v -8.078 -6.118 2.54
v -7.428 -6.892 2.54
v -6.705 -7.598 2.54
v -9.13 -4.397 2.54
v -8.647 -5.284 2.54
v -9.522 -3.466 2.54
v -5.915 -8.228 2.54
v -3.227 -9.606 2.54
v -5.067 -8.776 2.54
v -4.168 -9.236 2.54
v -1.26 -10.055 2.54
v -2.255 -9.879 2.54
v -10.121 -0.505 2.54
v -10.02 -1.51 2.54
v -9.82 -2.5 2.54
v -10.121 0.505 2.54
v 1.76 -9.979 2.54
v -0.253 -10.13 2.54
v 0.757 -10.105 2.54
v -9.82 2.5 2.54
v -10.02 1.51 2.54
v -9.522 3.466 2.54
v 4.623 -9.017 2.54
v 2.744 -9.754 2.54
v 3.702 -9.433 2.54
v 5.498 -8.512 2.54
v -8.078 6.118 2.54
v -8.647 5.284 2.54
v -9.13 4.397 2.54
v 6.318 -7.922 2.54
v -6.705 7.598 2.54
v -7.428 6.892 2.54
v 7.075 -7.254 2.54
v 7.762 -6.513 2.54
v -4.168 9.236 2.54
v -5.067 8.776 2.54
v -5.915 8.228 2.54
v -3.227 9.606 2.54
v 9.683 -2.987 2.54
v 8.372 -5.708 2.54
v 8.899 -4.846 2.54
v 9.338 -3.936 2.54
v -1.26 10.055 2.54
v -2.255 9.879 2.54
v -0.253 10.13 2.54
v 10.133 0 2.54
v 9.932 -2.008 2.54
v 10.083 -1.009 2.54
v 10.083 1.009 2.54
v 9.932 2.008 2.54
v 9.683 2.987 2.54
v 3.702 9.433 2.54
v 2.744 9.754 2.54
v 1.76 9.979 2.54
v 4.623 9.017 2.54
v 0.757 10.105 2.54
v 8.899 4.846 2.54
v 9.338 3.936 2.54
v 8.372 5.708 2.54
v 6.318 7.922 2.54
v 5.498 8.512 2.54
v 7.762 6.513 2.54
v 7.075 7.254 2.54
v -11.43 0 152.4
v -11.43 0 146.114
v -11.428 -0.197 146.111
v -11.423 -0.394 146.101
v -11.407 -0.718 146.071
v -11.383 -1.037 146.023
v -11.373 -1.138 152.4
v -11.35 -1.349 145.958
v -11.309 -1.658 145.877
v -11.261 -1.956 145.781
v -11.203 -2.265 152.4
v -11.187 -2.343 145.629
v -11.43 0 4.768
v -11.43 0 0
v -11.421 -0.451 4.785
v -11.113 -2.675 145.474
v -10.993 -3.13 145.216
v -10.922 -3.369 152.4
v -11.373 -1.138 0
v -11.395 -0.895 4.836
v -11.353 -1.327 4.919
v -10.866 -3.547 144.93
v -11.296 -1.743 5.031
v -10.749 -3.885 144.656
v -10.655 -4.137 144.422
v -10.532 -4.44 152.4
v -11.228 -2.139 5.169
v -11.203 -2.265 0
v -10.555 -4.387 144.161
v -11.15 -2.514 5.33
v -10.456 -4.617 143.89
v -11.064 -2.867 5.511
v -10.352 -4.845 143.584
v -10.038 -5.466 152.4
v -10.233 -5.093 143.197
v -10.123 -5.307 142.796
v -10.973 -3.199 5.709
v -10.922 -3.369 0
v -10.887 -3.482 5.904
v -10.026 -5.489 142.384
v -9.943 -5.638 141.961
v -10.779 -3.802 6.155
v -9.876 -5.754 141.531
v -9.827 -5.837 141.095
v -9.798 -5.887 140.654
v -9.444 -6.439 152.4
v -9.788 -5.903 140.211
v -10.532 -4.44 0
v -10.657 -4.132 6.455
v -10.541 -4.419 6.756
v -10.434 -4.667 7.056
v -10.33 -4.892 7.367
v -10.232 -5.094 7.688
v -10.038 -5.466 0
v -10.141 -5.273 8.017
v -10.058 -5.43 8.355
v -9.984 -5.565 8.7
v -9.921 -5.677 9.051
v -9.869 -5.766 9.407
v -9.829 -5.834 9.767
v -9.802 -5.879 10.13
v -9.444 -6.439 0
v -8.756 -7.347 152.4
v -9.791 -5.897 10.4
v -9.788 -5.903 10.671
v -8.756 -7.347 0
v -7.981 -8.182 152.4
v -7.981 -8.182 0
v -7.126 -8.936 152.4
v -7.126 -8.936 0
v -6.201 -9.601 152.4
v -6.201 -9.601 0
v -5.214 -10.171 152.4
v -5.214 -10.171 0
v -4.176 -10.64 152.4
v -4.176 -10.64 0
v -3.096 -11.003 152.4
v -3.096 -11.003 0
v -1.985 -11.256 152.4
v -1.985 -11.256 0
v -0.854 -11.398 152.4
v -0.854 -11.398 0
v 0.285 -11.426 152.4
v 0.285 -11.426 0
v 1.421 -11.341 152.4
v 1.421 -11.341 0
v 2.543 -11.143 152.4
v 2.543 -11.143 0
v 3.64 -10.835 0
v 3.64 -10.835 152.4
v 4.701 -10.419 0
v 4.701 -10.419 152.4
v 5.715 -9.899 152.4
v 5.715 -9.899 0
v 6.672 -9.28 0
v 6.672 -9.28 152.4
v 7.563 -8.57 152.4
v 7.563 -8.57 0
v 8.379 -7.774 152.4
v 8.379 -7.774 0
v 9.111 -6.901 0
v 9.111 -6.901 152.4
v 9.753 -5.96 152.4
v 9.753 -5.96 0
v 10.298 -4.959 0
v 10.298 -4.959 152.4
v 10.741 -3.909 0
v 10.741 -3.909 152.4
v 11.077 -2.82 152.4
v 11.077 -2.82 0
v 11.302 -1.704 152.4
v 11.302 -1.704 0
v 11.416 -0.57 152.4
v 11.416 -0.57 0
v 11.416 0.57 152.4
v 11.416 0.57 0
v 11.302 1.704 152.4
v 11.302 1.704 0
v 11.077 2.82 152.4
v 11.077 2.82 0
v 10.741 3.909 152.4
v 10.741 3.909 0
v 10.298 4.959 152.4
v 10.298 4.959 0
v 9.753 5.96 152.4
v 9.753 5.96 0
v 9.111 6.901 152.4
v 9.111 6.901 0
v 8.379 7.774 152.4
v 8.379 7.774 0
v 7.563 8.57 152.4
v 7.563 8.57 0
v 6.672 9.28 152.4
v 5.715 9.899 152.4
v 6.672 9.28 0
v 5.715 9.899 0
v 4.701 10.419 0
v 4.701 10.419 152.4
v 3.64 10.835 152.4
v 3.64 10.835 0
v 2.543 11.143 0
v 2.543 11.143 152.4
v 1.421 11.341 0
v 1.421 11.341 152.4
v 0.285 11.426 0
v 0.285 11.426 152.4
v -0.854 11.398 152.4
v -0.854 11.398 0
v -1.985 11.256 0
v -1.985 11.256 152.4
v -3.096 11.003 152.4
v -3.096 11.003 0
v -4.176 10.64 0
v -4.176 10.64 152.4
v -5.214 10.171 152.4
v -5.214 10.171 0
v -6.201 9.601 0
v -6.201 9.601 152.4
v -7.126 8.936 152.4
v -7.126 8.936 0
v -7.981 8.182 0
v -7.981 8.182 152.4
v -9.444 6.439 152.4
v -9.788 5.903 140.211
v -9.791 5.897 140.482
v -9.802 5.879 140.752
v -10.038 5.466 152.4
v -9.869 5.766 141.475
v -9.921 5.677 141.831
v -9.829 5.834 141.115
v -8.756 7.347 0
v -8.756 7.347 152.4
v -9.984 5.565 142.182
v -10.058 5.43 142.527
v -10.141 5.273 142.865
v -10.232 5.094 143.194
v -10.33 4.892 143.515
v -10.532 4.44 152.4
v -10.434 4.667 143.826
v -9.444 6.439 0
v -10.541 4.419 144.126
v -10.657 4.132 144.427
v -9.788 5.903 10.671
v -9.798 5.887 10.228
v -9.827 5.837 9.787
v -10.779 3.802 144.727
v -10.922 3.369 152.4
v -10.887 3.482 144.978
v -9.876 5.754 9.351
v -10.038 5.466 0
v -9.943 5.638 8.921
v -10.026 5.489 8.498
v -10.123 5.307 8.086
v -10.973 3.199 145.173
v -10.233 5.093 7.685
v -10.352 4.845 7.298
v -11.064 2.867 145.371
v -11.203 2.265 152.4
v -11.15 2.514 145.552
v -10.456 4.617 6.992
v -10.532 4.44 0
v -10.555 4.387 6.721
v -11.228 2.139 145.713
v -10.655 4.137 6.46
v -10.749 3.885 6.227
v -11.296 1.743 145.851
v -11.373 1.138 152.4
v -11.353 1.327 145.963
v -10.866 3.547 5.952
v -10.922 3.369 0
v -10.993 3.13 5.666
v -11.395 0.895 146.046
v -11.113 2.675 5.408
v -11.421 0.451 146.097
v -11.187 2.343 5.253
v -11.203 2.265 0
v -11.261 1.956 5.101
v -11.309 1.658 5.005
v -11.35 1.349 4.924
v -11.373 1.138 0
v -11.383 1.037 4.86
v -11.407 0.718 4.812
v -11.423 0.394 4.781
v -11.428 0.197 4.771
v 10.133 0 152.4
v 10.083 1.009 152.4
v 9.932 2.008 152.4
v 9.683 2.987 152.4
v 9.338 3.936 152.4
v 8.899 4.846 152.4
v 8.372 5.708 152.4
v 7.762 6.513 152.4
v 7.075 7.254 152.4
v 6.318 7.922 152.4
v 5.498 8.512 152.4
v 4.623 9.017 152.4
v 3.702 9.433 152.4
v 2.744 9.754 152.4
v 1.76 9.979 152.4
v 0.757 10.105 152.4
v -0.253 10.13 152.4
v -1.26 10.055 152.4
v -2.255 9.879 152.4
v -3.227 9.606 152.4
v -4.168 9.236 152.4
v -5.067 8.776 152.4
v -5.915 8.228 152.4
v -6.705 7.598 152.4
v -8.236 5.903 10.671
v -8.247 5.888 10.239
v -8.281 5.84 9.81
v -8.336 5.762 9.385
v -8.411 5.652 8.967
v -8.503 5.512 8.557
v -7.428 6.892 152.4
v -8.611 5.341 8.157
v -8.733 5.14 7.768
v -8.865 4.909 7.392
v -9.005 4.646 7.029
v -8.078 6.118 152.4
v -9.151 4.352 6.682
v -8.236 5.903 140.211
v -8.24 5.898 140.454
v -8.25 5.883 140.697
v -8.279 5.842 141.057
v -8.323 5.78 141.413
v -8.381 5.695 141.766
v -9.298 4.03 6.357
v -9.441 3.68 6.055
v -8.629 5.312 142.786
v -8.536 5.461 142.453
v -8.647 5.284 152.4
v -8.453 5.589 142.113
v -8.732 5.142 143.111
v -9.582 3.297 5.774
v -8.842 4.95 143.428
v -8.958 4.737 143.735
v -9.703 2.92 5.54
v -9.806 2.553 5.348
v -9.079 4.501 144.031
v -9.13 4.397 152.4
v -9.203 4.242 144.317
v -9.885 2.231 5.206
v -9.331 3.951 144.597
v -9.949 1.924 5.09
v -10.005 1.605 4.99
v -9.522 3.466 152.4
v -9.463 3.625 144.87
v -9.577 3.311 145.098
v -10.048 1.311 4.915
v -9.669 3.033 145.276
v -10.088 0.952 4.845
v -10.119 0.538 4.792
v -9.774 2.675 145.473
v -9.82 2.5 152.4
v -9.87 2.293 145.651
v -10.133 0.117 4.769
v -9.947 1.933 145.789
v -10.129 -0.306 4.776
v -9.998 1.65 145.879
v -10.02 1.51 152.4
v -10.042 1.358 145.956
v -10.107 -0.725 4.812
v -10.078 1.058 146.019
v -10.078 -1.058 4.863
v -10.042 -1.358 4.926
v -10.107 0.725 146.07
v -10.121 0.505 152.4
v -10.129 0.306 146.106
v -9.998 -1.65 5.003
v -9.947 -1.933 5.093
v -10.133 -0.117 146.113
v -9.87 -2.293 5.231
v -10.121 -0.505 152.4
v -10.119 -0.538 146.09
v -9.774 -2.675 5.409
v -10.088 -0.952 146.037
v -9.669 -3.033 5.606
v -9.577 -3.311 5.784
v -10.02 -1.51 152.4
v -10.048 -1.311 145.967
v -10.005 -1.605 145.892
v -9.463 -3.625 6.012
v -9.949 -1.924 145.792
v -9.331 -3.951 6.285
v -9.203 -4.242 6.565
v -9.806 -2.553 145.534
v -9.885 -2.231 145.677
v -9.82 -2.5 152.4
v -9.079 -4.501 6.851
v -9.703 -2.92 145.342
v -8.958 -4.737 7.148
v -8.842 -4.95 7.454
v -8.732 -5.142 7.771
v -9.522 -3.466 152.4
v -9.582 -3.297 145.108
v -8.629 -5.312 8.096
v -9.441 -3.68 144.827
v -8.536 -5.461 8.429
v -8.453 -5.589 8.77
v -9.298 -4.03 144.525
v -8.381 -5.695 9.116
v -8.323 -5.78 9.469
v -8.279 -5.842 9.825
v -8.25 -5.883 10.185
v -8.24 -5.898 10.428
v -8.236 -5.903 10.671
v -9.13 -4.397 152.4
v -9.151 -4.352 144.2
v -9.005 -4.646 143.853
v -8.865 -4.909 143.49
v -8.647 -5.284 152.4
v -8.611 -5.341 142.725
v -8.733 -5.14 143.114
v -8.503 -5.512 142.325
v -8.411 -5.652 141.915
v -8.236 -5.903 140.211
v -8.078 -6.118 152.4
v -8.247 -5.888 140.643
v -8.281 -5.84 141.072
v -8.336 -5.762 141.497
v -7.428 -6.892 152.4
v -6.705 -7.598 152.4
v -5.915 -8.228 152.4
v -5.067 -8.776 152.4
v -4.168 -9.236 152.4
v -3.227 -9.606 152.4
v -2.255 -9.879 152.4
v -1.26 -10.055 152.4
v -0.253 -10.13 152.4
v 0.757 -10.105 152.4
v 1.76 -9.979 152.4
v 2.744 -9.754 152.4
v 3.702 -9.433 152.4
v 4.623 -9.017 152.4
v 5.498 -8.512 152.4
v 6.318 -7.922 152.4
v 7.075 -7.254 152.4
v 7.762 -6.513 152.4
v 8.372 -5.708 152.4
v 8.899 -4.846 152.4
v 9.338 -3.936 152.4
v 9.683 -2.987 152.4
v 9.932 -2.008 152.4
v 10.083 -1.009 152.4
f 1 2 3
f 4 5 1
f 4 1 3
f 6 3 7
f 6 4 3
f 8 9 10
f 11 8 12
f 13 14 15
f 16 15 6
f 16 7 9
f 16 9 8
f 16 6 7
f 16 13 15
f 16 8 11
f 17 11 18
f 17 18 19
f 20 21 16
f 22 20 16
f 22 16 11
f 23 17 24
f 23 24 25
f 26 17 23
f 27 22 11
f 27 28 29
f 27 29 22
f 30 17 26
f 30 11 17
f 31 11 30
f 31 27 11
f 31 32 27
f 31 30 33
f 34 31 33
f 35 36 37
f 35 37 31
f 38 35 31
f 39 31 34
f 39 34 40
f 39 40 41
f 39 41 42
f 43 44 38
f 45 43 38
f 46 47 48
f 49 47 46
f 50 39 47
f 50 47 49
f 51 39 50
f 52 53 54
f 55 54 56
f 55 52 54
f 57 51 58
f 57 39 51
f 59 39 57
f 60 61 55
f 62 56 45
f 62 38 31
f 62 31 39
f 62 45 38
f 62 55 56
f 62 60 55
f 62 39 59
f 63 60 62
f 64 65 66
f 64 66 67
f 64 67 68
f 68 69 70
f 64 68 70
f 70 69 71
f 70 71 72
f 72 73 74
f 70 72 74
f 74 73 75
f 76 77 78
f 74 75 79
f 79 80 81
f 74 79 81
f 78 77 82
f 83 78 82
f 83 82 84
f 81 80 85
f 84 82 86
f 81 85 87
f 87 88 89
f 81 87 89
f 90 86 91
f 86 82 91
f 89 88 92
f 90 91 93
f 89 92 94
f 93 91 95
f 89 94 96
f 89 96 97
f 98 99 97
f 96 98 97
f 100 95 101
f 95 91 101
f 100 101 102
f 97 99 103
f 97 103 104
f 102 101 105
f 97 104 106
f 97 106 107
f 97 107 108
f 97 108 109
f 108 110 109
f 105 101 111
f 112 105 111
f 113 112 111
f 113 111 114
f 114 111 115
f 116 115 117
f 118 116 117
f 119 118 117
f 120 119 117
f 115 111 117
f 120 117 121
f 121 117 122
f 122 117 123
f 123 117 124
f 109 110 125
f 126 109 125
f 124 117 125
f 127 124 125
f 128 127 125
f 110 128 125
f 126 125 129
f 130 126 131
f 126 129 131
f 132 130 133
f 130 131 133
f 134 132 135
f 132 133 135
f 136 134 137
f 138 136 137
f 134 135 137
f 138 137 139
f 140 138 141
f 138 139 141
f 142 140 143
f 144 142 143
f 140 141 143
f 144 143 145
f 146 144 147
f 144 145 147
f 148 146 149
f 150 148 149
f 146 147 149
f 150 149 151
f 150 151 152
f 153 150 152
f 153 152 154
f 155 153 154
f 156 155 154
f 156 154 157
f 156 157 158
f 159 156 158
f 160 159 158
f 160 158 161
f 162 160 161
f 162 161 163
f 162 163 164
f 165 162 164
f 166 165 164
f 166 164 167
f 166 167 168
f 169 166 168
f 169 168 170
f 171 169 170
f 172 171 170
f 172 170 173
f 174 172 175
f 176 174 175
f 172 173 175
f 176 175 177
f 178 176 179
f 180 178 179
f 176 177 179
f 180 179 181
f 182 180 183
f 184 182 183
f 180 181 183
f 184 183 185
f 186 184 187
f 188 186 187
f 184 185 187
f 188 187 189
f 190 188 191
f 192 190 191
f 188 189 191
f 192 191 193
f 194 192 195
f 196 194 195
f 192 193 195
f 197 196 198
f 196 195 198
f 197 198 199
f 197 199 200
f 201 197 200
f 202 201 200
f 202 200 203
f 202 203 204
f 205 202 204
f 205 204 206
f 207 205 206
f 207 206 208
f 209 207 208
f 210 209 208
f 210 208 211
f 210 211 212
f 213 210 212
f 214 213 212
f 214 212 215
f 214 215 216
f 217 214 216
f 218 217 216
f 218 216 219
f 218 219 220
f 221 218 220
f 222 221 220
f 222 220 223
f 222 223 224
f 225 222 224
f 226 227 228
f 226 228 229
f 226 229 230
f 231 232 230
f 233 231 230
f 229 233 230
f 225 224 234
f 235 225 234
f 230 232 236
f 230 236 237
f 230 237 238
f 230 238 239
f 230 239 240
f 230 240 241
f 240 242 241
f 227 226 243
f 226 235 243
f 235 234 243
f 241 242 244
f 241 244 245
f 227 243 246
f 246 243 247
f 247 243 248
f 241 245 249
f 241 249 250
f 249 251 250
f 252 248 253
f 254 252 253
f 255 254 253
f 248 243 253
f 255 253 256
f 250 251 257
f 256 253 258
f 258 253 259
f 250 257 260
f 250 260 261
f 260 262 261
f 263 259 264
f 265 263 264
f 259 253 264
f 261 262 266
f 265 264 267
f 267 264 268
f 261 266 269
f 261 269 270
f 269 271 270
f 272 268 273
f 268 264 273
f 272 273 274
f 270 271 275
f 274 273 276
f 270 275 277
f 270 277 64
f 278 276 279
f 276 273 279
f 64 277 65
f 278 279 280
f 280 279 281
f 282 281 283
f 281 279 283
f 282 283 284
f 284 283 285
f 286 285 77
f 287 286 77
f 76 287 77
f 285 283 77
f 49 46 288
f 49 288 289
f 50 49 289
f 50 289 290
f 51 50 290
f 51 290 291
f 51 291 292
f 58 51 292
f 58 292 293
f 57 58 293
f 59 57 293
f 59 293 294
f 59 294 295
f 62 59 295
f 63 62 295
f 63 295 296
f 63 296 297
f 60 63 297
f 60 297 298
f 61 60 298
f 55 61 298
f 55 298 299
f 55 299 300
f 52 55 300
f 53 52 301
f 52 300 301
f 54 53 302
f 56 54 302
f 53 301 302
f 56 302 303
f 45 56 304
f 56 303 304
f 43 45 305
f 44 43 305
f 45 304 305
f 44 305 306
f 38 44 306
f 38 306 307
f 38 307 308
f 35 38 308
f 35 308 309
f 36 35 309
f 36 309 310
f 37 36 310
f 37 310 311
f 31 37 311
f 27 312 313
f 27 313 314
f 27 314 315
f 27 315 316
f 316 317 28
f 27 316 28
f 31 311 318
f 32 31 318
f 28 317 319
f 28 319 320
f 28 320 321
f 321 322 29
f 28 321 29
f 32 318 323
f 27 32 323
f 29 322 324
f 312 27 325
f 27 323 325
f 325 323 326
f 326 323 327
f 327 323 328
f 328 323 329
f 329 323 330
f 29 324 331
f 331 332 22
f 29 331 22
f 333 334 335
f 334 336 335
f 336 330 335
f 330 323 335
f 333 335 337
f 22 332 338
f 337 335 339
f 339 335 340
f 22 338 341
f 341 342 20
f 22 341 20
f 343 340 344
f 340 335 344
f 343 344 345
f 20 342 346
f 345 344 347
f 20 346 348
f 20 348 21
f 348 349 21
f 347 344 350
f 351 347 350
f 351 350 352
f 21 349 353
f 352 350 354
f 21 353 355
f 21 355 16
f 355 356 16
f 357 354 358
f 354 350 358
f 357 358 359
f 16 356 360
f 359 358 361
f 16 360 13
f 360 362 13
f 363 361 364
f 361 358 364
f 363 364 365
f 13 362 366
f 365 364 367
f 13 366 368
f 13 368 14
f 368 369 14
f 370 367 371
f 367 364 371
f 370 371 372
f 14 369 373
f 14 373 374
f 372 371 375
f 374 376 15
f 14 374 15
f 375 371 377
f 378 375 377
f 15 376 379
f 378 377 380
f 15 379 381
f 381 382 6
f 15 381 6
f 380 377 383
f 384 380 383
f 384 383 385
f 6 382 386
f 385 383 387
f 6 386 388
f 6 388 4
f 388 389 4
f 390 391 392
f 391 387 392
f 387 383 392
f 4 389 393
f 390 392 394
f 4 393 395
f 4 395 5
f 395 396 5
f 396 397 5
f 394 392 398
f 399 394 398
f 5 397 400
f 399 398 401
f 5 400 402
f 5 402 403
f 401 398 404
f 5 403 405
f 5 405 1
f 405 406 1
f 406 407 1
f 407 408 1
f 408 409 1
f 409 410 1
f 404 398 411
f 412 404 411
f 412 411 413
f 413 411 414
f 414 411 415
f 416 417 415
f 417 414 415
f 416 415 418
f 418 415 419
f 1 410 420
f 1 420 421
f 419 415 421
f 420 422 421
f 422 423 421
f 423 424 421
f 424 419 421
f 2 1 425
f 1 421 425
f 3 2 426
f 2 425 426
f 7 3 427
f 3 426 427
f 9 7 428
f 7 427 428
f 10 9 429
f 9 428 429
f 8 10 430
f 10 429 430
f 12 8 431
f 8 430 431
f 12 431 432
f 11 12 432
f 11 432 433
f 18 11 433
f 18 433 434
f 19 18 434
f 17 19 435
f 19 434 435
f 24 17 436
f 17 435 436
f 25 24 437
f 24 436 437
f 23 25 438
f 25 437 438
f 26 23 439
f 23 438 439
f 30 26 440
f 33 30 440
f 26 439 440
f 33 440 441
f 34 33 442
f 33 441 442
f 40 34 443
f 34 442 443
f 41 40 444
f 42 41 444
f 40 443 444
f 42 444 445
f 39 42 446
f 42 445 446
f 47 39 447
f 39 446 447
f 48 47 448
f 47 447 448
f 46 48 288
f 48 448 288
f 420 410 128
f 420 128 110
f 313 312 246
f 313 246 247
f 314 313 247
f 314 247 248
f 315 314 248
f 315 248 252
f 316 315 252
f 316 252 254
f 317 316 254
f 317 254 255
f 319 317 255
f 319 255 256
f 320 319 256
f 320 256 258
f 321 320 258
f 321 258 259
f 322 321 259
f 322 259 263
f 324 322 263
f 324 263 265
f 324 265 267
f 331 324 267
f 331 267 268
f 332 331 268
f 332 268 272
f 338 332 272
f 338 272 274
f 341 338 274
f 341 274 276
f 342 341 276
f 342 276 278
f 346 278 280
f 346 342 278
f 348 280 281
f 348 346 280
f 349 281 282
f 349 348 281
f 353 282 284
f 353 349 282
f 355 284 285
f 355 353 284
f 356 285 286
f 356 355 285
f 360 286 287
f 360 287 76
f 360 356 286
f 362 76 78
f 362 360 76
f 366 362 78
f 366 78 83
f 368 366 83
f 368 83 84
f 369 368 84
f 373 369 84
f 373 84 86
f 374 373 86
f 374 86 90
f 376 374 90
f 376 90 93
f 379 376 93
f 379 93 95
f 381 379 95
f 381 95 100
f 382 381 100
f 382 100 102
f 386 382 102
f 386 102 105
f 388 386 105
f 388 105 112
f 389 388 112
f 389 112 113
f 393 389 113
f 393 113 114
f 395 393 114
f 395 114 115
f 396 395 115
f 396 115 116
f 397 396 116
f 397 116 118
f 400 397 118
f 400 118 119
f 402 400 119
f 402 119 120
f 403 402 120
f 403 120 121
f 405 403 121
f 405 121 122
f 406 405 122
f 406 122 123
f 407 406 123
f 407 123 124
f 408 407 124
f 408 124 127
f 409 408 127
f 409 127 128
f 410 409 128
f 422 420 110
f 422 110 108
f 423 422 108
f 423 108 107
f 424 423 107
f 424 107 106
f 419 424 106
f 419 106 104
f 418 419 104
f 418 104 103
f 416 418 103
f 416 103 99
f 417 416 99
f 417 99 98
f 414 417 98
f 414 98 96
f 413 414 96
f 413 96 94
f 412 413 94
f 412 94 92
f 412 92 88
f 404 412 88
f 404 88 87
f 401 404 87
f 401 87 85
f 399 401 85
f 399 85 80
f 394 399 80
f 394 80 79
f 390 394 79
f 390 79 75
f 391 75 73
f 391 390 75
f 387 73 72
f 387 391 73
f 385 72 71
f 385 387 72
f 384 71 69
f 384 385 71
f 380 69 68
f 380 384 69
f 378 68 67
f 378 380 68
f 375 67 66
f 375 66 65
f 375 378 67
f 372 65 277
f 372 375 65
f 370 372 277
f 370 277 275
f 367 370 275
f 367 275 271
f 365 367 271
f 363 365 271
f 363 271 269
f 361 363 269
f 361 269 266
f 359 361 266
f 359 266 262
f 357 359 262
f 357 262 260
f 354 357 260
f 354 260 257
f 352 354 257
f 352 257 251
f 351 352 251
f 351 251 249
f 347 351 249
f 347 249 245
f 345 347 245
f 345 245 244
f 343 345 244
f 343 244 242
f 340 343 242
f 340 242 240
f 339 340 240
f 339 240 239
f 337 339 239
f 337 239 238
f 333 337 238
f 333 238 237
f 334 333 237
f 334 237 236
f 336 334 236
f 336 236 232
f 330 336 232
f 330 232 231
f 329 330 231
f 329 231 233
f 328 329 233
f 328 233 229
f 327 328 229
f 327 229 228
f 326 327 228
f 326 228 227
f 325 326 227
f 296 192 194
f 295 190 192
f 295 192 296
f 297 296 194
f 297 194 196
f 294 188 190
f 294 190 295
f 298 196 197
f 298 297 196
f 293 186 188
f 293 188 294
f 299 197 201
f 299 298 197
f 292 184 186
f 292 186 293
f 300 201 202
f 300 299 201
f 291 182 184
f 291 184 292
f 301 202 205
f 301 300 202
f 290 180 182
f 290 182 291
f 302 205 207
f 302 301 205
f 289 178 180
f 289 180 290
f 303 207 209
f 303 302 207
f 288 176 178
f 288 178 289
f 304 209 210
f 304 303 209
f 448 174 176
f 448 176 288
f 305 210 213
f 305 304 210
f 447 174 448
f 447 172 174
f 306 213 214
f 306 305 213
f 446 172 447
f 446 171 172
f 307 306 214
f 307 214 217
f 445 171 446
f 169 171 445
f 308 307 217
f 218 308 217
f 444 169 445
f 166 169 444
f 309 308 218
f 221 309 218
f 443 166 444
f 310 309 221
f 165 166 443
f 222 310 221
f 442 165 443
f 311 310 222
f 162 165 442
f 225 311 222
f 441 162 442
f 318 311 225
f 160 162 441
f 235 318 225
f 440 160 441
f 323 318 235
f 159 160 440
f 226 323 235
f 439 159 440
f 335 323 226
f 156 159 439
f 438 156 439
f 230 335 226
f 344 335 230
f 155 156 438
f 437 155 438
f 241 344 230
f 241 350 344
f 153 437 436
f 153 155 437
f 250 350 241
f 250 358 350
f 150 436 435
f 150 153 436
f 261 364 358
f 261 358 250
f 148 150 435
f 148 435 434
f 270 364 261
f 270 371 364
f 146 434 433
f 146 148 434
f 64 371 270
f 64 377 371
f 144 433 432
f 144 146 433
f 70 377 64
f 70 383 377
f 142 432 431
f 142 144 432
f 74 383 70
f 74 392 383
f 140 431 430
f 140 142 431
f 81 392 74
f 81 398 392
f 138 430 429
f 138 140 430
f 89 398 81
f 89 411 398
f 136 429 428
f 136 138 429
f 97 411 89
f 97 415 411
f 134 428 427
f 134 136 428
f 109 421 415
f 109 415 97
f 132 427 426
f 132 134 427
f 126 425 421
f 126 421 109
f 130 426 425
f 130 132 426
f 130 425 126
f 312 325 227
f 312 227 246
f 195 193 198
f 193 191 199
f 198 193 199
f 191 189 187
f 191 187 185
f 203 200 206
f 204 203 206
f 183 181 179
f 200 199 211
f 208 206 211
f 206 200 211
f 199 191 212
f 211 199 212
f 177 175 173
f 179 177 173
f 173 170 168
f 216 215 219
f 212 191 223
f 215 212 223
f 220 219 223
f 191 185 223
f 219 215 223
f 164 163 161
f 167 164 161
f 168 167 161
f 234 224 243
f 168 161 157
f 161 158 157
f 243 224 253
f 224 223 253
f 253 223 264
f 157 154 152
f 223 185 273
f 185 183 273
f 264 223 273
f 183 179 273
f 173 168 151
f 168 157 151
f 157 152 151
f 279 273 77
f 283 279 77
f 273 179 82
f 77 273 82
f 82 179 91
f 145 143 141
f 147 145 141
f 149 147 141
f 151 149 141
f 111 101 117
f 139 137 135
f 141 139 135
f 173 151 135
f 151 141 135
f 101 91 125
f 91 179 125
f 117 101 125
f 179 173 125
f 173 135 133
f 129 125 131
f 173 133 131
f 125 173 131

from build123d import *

# Parameters (mm, degrees)
SKETCH1_R           = 11.43
BOSS_EXTRUDE1_DEPTH = 152.4
SKETCH2_R           = 10.133203601
CUT_EXTRUDE1_DEPTH  = 149.86
CUT_EXTRUDE2_DEPTH  = 12.7


with BuildPart() as part:
    # Sketch1 → Boss-Extrude1 (new body)
    with BuildSketch(Plane.XY):
        with Locations(Location((0, 0, 0), (0, 0, 180))):
            Circle(SKETCH1_R)
    extrude(amount=BOSS_EXTRUDE1_DEPTH)

    # Sketch2 → Cut-Extrude1 (cut)
    with BuildSketch(Plane.XY.offset(152.4)):
        Circle(SKETCH2_R)
    extrude(amount=-CUT_EXTRUDE1_DEPTH, mode=Mode.SUBTRACT)

    # Sketch3 → Cut-Extrude2 (cut)
    with BuildSketch(Plane(origin=(0, 0, 0), x_dir=(0, 0, -1), z_dir=(1, 0, 0))):
        with BuildLine():
            Line((-10.671040116, -5.903350135), (-140.211040116, -5.903350135))
            ThreePointArc((-140.211040116, -5.903350135), (-146.114390251, 0), (-140.211040116, 5.903350135))
            Line((-140.211040116, 5.903350135), (-10.671040116, 5.903350135))
            ThreePointArc((-10.671040116, 5.903350135), (-4.767689981, 0), (-10.671040116, -5.903350135))
        make_face()
    extrude(amount=-CUT_EXTRUDE2_DEPTH, mode=Mode.SUBTRACT)


solid = part.part
